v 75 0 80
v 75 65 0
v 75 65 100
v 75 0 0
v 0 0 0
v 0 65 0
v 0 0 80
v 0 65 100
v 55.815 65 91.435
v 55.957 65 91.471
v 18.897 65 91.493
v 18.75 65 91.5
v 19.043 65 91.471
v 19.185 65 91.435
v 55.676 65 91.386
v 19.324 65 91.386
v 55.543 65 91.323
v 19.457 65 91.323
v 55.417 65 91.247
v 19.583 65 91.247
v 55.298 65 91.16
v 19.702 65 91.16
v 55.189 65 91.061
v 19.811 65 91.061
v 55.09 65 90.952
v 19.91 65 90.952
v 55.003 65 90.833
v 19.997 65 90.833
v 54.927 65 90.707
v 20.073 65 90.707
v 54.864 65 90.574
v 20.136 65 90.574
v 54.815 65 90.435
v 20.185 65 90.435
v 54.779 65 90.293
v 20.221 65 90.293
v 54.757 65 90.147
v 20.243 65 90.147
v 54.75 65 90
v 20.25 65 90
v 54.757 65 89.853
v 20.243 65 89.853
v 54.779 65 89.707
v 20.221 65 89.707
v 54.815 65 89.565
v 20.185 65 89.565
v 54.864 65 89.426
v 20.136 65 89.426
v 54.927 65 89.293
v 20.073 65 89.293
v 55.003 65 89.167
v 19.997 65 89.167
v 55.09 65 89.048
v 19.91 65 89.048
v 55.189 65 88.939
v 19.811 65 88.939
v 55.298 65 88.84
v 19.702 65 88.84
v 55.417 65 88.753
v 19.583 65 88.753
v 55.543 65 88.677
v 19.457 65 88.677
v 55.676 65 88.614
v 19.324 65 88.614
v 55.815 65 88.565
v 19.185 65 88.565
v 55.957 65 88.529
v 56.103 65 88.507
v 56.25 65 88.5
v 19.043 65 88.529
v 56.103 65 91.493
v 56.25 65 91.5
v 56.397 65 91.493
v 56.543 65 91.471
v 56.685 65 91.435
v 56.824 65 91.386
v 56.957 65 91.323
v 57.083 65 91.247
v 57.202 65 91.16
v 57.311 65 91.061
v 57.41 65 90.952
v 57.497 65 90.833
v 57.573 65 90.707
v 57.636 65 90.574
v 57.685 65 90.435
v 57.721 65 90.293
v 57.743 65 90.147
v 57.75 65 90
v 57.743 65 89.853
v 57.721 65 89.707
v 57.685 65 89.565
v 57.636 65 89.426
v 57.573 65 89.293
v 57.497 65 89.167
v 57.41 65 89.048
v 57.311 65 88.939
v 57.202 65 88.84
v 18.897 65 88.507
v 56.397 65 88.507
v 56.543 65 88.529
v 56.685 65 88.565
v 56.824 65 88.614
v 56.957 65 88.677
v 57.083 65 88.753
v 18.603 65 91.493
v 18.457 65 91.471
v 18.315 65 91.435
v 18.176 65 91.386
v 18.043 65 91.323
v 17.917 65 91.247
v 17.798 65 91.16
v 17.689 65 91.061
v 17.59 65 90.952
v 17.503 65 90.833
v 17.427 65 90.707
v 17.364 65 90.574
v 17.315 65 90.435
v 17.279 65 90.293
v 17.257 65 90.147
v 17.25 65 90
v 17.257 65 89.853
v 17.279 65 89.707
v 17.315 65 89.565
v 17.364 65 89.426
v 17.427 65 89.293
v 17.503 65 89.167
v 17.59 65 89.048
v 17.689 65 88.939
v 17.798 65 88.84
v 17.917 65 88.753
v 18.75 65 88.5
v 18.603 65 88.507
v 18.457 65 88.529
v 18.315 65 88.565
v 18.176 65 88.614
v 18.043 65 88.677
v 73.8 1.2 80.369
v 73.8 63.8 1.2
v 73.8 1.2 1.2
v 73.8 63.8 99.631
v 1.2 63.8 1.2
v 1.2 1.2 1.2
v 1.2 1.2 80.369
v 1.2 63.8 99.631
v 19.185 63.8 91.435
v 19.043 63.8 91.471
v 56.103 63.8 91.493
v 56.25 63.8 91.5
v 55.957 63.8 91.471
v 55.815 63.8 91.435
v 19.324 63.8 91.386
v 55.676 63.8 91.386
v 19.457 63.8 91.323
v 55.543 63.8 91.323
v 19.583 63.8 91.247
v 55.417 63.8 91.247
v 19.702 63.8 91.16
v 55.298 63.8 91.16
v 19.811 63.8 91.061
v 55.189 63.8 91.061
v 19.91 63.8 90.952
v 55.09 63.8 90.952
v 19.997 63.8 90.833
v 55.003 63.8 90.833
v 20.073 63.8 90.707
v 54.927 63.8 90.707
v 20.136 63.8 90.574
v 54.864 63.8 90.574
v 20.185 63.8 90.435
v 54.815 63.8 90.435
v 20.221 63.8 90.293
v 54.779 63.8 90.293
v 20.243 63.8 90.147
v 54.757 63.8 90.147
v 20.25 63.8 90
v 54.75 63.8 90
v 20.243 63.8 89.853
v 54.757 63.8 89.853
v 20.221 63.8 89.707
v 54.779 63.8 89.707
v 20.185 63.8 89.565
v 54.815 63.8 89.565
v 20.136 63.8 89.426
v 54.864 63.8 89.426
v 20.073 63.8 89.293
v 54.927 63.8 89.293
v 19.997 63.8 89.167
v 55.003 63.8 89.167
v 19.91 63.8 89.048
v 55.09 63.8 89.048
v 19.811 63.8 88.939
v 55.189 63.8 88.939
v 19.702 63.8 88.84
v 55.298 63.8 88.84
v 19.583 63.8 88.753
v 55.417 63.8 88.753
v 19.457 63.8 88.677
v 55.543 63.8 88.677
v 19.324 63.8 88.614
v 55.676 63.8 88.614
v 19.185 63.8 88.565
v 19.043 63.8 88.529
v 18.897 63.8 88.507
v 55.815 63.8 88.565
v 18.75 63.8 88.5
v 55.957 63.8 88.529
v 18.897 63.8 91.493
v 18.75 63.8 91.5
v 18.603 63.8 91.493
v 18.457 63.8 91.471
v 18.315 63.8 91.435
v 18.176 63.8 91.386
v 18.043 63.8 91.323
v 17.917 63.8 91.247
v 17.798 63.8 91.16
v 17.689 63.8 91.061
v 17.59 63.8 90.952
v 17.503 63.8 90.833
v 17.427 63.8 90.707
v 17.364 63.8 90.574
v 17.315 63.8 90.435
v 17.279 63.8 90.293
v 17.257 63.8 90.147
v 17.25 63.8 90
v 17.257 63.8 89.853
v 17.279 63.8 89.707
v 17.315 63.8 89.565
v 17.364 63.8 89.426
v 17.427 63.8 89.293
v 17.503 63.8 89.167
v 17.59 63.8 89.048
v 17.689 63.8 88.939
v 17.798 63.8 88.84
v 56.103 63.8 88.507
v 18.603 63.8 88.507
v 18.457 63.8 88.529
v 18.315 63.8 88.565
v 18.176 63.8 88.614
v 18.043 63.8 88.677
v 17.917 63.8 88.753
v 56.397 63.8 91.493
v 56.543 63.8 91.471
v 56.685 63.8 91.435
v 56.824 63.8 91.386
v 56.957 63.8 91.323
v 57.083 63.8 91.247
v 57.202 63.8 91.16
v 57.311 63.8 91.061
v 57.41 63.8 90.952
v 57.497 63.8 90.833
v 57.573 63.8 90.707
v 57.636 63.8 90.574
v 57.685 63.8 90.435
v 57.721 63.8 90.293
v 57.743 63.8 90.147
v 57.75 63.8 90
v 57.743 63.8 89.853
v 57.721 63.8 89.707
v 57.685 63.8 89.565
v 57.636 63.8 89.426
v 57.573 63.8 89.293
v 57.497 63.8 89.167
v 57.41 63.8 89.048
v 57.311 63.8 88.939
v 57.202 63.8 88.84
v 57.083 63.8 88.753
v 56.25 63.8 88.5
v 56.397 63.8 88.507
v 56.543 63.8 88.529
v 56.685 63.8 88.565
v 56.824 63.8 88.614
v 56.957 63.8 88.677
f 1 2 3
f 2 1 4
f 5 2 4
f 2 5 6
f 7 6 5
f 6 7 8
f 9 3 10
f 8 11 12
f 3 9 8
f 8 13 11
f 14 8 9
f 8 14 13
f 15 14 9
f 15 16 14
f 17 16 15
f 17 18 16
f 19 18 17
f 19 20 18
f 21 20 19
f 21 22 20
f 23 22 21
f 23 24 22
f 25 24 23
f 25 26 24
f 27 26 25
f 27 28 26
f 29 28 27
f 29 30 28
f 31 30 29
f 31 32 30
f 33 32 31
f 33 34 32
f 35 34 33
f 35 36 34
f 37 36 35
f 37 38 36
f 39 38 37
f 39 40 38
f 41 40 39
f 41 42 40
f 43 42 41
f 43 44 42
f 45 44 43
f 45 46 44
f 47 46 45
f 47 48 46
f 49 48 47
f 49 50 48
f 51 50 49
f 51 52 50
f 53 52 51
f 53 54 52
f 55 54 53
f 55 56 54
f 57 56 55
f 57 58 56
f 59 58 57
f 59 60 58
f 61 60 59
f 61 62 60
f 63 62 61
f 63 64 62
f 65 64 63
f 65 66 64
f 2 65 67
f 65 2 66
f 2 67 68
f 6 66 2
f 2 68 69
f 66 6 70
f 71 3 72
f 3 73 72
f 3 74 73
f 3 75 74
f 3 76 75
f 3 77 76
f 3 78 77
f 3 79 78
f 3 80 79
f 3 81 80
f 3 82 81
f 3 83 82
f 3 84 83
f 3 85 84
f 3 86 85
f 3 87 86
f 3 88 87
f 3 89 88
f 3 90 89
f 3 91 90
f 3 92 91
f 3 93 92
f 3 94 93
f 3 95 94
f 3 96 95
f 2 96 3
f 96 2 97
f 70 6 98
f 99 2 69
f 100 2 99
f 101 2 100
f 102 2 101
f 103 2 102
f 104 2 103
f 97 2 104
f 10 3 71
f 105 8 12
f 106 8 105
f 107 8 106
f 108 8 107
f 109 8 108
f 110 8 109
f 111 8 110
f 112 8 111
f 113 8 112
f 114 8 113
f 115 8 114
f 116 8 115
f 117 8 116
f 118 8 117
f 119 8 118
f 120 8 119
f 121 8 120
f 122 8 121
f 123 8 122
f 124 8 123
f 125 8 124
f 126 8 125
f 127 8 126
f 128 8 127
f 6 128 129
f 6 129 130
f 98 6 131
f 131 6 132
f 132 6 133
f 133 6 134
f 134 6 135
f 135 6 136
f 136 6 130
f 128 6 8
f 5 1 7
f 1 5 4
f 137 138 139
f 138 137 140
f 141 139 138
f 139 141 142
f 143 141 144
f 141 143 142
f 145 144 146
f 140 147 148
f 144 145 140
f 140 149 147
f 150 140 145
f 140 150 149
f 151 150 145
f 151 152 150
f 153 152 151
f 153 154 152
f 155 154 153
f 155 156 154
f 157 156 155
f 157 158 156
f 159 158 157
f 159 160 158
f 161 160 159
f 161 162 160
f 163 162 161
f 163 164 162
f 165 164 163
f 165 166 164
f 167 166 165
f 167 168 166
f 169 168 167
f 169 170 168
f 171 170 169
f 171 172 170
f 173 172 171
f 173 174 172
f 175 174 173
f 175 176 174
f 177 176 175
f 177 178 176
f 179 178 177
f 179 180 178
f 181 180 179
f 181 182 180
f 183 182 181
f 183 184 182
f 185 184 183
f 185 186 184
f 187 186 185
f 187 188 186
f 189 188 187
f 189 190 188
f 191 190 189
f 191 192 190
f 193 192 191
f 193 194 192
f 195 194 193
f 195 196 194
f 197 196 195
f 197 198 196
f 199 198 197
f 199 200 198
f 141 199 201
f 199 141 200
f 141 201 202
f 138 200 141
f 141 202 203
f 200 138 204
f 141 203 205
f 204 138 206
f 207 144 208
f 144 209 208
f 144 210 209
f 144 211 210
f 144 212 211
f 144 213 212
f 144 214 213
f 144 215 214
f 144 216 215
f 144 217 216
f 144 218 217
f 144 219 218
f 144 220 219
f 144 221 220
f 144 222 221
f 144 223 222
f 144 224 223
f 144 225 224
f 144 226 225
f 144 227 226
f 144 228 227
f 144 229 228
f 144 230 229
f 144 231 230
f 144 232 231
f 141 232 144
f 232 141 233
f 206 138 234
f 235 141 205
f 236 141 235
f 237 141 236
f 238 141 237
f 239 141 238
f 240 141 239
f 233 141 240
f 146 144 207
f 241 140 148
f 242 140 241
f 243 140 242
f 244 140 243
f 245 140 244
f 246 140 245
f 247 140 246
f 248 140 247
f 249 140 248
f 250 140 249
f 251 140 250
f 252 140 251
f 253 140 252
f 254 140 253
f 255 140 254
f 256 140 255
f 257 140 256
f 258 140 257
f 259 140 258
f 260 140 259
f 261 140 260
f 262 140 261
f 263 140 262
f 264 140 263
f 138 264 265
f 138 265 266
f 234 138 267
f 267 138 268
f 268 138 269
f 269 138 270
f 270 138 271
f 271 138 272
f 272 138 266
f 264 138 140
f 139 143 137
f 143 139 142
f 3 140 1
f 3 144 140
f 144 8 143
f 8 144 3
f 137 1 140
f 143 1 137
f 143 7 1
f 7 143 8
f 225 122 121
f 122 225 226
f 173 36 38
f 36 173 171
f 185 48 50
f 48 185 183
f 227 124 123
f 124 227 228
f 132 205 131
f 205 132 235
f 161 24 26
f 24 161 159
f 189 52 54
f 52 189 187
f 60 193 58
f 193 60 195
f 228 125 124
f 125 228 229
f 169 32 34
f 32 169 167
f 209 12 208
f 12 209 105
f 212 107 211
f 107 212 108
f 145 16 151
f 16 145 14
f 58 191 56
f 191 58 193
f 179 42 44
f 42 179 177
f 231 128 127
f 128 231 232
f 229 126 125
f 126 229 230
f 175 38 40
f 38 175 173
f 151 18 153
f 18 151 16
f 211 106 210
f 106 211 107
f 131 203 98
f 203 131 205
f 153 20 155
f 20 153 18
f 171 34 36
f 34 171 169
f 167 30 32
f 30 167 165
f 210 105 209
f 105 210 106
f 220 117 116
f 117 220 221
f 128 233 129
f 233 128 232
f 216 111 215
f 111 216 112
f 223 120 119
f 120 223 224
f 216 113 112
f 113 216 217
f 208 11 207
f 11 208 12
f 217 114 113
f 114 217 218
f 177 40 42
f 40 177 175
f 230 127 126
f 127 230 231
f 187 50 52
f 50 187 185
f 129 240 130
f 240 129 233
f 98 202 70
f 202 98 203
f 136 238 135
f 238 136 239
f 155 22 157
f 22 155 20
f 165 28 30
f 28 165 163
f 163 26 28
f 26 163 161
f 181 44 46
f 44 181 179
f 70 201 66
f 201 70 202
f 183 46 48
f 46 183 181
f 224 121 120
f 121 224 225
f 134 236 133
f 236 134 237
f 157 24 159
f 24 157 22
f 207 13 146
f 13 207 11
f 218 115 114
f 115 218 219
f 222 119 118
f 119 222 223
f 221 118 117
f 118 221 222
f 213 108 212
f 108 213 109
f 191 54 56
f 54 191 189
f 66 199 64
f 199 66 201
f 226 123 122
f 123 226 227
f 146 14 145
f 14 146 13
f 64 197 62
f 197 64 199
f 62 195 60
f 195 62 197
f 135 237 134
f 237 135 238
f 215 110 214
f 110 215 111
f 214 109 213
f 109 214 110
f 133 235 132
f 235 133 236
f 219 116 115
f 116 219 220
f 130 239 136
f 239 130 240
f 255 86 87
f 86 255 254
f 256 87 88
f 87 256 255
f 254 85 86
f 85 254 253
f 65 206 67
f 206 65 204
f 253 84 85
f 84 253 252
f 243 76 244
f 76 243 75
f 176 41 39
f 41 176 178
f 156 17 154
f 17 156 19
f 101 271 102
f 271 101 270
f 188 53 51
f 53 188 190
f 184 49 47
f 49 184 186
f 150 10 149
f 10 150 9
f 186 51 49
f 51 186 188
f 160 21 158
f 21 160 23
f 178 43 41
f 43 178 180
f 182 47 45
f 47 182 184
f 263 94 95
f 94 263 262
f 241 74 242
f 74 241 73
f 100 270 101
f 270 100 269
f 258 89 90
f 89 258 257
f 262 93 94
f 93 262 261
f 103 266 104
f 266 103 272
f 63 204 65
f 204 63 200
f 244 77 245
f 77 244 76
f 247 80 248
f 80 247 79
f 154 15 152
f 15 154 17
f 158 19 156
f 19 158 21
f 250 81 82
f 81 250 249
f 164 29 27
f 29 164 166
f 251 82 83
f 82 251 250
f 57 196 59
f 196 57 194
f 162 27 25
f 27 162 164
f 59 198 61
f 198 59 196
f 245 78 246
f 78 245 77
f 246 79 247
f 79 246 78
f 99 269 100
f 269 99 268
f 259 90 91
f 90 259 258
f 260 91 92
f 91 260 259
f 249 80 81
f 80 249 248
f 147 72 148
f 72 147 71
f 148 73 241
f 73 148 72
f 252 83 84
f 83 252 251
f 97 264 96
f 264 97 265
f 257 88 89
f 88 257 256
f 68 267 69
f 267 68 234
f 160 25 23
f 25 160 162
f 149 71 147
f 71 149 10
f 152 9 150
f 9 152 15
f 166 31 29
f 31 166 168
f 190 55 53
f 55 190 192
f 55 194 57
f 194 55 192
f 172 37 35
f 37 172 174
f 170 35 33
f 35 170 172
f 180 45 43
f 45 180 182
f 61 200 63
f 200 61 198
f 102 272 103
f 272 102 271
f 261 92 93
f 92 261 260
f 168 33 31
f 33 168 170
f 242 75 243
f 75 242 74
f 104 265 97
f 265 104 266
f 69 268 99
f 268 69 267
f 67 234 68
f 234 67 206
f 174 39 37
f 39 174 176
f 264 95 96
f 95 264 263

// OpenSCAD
//krabicka na promanum
//65 mm šířka
//75 mm délka
//80 mm výška přední
//100 mm výška zadní
//boky skosené
//vzadu 2x díra 3 mm průměr


delka = 75;
sirka = 65;
vyska_predek = 80;
vyska_zadek = 100;
dira = 3;
tryska = 0.4;
sirka_steny = 6*tryska;
fudge = 1;
delka_sikme = sqrt(sirka*sirka+(vyska_zadek-vyska_predek)*(vyska_zadek-vyska_predek));
rozdil_zadek = vyska_zadek - vyska_predek;

difference()
{
cube ([delka,sirka,vyska_zadek]);
    
    translate([sirka_steny/2,sirka_steny/2,sirka_steny/2,])
cube ([delka-sirka_steny,sirka-sirka_steny,vyska_zadek+fudge]);   
    

translate ([0,0,vyska_predek])
rotate([asin(rozdil_zadek/delka_sikme),0,0])
#cube ([delka,delka_sikme,vyska_predek]);
echo(delka_sikme);

 //dírka první
translate([(delka/4),sirka+fudge,(vyska_zadek-rozdil_zadek/2)])
rotate([90,0,0])
#cylinder(d=dira, h=sirka_steny+4*fudge, $fn = 64);

    //díra druhá
translate([(3/4*delka),sirka+fudge,(vyska_zadek-rozdil_zadek/2)])
rotate([90,0,0])
#cylinder(d=dira, h=sirka_steny+4*fudge, $fn = 64);
    
}
